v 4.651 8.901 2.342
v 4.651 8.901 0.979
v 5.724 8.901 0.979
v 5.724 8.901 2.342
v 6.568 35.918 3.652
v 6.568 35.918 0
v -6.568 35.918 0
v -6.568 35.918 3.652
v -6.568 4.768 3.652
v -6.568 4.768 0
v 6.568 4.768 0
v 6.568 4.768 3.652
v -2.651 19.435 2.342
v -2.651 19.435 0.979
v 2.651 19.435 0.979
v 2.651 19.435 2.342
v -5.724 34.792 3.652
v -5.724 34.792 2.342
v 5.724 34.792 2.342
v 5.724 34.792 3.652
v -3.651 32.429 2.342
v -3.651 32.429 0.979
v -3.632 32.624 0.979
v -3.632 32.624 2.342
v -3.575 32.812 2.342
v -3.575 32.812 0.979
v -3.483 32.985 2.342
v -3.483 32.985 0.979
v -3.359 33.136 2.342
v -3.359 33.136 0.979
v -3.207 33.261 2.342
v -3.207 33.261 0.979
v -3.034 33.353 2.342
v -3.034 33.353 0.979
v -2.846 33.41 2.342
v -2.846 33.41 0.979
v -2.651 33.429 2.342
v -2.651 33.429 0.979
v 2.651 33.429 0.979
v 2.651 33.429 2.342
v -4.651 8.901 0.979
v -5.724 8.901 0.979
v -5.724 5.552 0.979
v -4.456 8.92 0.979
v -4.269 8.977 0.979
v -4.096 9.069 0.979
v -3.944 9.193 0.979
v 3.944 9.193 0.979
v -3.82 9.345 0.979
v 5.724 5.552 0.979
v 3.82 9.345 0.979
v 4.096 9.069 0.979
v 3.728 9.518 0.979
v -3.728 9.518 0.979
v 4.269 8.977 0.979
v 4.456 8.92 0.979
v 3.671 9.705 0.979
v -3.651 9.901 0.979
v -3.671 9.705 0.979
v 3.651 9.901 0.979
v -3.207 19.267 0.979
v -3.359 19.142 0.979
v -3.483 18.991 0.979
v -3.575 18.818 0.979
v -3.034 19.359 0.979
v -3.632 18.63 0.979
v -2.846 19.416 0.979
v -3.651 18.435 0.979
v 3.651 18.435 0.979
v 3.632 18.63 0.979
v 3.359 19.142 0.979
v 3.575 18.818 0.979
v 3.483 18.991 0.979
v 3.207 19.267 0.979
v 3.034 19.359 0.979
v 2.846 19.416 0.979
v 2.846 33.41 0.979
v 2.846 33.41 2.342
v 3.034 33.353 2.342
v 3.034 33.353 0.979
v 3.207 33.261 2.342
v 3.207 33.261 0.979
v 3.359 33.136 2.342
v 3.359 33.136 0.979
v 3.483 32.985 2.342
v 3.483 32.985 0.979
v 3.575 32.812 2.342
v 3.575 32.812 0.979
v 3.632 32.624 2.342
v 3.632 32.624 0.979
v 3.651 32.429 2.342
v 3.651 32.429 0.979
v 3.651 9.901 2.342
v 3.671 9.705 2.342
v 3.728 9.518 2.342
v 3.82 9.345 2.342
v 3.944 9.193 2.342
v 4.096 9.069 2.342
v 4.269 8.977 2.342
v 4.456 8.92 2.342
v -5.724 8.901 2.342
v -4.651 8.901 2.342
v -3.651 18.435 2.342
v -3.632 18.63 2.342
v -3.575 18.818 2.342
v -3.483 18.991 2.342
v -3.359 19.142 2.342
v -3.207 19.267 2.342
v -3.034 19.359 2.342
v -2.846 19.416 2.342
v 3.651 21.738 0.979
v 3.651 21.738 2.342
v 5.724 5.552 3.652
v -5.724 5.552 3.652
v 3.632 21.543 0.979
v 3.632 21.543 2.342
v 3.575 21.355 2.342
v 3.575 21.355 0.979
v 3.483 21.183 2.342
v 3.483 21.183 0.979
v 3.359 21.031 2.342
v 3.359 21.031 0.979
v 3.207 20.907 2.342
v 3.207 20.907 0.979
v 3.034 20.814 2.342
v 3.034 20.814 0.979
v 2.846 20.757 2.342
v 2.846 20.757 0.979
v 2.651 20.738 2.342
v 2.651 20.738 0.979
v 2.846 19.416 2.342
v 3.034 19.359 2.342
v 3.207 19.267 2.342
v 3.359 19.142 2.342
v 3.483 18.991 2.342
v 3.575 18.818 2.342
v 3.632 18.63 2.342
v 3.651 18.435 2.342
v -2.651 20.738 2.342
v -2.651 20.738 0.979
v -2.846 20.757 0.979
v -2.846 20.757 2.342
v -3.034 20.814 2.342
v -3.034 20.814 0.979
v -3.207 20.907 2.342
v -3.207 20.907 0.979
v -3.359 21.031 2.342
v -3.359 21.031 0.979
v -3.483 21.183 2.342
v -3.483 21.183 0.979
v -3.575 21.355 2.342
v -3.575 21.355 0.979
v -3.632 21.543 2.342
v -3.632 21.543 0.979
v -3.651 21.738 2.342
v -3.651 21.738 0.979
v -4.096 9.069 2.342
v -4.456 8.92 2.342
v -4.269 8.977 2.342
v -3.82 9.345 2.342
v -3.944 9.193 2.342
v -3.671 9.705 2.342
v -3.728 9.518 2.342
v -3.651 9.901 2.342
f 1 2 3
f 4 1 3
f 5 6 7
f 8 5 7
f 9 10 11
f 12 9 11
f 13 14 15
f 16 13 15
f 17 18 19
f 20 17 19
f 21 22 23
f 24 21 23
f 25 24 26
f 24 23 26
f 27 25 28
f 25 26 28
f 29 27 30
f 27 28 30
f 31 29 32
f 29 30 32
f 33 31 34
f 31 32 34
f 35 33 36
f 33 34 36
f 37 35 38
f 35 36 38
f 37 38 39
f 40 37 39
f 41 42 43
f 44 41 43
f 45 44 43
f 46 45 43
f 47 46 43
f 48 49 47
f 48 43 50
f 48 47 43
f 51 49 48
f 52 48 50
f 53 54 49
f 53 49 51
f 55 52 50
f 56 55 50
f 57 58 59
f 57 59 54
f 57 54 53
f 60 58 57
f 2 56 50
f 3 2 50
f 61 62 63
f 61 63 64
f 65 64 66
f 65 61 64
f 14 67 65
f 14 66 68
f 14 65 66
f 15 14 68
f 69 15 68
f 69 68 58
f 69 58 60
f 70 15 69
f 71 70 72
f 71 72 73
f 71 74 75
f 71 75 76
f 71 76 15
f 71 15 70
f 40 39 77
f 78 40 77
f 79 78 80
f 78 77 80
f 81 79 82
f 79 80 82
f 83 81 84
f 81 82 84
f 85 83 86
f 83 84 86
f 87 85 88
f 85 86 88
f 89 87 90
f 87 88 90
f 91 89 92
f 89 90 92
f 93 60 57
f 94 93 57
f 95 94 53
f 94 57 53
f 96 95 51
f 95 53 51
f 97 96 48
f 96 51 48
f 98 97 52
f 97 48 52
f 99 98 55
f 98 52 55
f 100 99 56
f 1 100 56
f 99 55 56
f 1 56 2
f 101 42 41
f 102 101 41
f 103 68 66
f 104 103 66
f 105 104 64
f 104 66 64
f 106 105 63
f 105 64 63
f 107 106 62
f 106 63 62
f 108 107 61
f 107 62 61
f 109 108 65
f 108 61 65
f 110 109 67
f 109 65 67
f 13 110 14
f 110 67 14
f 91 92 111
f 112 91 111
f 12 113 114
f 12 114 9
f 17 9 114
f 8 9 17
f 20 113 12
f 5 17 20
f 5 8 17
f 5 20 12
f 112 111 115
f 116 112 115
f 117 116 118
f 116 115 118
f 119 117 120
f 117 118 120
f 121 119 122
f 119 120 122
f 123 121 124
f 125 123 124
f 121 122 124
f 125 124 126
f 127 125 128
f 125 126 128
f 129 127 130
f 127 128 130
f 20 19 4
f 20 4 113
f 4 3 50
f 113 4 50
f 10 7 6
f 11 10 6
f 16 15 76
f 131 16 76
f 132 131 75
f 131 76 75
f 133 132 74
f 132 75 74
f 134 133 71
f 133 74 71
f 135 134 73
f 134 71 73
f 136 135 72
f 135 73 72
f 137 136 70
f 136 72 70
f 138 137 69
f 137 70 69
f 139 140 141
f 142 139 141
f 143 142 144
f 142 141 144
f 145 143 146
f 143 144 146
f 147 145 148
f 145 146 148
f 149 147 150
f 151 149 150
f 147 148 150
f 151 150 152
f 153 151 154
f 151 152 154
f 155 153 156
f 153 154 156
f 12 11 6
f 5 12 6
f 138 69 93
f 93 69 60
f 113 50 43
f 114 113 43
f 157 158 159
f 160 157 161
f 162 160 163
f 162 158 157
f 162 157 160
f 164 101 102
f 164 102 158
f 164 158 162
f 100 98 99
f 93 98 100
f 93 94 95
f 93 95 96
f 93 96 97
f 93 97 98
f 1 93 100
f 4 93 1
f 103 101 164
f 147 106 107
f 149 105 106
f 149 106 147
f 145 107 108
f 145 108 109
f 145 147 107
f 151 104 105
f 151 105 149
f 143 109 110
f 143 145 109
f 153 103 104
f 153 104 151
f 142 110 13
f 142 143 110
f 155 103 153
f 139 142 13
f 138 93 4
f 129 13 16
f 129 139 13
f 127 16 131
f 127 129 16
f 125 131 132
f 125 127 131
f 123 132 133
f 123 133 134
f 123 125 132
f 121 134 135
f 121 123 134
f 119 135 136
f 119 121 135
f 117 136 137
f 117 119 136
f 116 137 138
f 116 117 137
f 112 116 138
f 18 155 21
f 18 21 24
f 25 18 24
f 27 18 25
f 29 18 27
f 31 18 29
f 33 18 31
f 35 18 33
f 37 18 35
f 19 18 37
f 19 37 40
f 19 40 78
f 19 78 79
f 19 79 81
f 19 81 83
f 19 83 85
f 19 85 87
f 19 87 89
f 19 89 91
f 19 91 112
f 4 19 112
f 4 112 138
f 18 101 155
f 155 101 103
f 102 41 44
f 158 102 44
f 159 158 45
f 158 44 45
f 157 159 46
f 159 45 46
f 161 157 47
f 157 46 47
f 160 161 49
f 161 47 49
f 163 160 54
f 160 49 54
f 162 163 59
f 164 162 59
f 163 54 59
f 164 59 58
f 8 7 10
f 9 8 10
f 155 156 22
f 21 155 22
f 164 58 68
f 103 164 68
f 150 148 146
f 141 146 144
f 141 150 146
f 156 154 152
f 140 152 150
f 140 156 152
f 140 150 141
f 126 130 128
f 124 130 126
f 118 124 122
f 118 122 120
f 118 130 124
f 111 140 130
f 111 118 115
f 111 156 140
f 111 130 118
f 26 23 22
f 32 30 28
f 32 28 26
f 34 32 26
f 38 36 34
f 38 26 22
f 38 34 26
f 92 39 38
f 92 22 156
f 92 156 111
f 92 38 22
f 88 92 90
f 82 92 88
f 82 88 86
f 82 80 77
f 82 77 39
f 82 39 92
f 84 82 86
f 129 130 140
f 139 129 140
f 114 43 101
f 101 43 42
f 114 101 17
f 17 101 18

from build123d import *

# Parameters (mm, degrees)
F1_DEPTH = 0.97852
F2_DEPTH = 2.34214
F3_DEPTH = 3.65164


with BuildPart() as f1:
    # F0 (on Top) → F1 (new body)
    with BuildSketch(Plane.XY):
        with BuildLine():
            Line((0, 5.55195), (5.724427, 5.55195))
            Line((5.724427, 5.55195), (5.724427, 8.900544))
            Line((5.724427, 8.900544), (4.651407, 8.900544))
            ThreePointArc((4.651407, 8.900544), (3.9443, 9.193437), (3.651407, 9.900544))
            Line((3.651407, 9.900544), (3.651407, 18.435233))
            ThreePointArc((3.651407, 18.435233), (3.358514, 19.142339), (2.651407, 19.435233))
            Line((2.651407, 19.435233), (-2.651407, 19.435233))
            ThreePointArc((-2.651407, 19.435233), (-3.358514, 19.142339), (-3.651407, 18.435233))
            Line((-3.651407, 18.435233), (-3.651407, 9.900544))
            ThreePointArc((-3.651407, 9.900544), (-3.9443, 9.193437), (-4.651407, 8.900544))
            Line((-4.651407, 8.900544), (-5.724427, 8.900544))
            Line((-5.724427, 8.900544), (-5.724427, 5.55195))
            Line((-5.724427, 5.55195), (0, 5.55195))
        make_face()
        with BuildLine():
            ThreePointArc((3.651407, 32.429379), (3.358514, 33.136486), (2.651407, 33.429379))
            Line((2.651407, 33.429379), (0, 33.429379))
            Line((0, 33.429379), (-2.651407, 33.429379))
            ThreePointArc((-2.651407, 33.429379), (-3.358514, 33.136486), (-3.651407, 32.429379))
            Line((-3.651407, 32.429379), (-3.651407, 21.738077))
            ThreePointArc((-3.651407, 21.738077), (-3.358514, 21.03097), (-2.651407, 20.738077))
            Line((-2.651407, 20.738077), (2.651407, 20.738077))
            ThreePointArc((2.651407, 20.738077), (3.358514, 21.03097), (3.651407, 21.738077))
            Line((3.651407, 21.738077), (3.651407, 32.429379))
        make_face()
    extrude(amount=F1_DEPTH)

    # F0 (on Top) → F2 (join)
    with BuildSketch(Plane.XY):
        with BuildLine():
            Line((4.651407, 8.900544), (5.724427, 8.900544))
            Line((5.724427, 8.900544), (5.724427, 34.792196))
            Line((5.724427, 34.792196), (0, 34.792196))
            Line((0, 34.792196), (-5.724427, 34.792196))
            Line((-5.724427, 34.792196), (-5.724427, 8.900544))
            Line((-5.724427, 8.900544), (-4.651407, 8.900544))
            ThreePointArc((-4.651407, 8.900544), (-3.9443, 9.193437), (-3.651407, 9.900544))
            Line((-3.651407, 9.900544), (-3.651407, 18.435233))
            ThreePointArc((-3.651407, 18.435233), (-3.358514, 19.142339), (-2.651407, 19.435233))
            Line((-2.651407, 19.435233), (2.651407, 19.435233))
            ThreePointArc((2.651407, 19.435233), (3.358514, 19.142339), (3.651407, 18.435233))
            Line((3.651407, 18.435233), (3.651407, 9.900544))
            ThreePointArc((3.651407, 9.900544), (3.9443, 9.193437), (4.651407, 8.900544))
        make_face()
        with BuildLine():
            Line((0, 33.429379), (2.651407, 33.429379))
            ThreePointArc((2.651407, 33.429379), (3.358514, 33.136486), (3.651407, 32.429379))
            Line((3.651407, 32.429379), (3.651407, 21.738077))
            ThreePointArc((3.651407, 21.738077), (3.358514, 21.03097), (2.651407, 20.738077))
            Line((2.651407, 20.738077), (-2.651407, 20.738077))
            ThreePointArc((-2.651407, 20.738077), (-3.358514, 21.03097), (-3.651407, 21.738077))
            Line((-3.651407, 21.738077), (-3.651407, 32.429379))
            ThreePointArc((-3.651407, 32.429379), (-3.358514, 33.136486), (-2.651407, 33.429379))
            Line((-2.651407, 33.429379), (0, 33.429379))
        make_face(mode=Mode.SUBTRACT)
    extrude(amount=F2_DEPTH)

    # F0 (on Top) → F3 (join)
    with BuildSketch(Plane.XY):
        Polygon((6.567956, 4.76807), (6.567956, 35.9184), (0, 35.9184), (-6.567956, 35.9184), (-6.567956, 4.76807), (0, 4.76807), align=None)
        Polygon((5.724427, 8.900544), (5.724427, 5.55195), (0, 5.55195), (-5.724427, 5.55195), (-5.724427, 8.900544), (-5.724427, 34.792196), (0, 34.792196), (5.724427, 34.792196), align=None, mode=Mode.SUBTRACT)
    extrude(amount=F3_DEPTH)


solid = f1.part
